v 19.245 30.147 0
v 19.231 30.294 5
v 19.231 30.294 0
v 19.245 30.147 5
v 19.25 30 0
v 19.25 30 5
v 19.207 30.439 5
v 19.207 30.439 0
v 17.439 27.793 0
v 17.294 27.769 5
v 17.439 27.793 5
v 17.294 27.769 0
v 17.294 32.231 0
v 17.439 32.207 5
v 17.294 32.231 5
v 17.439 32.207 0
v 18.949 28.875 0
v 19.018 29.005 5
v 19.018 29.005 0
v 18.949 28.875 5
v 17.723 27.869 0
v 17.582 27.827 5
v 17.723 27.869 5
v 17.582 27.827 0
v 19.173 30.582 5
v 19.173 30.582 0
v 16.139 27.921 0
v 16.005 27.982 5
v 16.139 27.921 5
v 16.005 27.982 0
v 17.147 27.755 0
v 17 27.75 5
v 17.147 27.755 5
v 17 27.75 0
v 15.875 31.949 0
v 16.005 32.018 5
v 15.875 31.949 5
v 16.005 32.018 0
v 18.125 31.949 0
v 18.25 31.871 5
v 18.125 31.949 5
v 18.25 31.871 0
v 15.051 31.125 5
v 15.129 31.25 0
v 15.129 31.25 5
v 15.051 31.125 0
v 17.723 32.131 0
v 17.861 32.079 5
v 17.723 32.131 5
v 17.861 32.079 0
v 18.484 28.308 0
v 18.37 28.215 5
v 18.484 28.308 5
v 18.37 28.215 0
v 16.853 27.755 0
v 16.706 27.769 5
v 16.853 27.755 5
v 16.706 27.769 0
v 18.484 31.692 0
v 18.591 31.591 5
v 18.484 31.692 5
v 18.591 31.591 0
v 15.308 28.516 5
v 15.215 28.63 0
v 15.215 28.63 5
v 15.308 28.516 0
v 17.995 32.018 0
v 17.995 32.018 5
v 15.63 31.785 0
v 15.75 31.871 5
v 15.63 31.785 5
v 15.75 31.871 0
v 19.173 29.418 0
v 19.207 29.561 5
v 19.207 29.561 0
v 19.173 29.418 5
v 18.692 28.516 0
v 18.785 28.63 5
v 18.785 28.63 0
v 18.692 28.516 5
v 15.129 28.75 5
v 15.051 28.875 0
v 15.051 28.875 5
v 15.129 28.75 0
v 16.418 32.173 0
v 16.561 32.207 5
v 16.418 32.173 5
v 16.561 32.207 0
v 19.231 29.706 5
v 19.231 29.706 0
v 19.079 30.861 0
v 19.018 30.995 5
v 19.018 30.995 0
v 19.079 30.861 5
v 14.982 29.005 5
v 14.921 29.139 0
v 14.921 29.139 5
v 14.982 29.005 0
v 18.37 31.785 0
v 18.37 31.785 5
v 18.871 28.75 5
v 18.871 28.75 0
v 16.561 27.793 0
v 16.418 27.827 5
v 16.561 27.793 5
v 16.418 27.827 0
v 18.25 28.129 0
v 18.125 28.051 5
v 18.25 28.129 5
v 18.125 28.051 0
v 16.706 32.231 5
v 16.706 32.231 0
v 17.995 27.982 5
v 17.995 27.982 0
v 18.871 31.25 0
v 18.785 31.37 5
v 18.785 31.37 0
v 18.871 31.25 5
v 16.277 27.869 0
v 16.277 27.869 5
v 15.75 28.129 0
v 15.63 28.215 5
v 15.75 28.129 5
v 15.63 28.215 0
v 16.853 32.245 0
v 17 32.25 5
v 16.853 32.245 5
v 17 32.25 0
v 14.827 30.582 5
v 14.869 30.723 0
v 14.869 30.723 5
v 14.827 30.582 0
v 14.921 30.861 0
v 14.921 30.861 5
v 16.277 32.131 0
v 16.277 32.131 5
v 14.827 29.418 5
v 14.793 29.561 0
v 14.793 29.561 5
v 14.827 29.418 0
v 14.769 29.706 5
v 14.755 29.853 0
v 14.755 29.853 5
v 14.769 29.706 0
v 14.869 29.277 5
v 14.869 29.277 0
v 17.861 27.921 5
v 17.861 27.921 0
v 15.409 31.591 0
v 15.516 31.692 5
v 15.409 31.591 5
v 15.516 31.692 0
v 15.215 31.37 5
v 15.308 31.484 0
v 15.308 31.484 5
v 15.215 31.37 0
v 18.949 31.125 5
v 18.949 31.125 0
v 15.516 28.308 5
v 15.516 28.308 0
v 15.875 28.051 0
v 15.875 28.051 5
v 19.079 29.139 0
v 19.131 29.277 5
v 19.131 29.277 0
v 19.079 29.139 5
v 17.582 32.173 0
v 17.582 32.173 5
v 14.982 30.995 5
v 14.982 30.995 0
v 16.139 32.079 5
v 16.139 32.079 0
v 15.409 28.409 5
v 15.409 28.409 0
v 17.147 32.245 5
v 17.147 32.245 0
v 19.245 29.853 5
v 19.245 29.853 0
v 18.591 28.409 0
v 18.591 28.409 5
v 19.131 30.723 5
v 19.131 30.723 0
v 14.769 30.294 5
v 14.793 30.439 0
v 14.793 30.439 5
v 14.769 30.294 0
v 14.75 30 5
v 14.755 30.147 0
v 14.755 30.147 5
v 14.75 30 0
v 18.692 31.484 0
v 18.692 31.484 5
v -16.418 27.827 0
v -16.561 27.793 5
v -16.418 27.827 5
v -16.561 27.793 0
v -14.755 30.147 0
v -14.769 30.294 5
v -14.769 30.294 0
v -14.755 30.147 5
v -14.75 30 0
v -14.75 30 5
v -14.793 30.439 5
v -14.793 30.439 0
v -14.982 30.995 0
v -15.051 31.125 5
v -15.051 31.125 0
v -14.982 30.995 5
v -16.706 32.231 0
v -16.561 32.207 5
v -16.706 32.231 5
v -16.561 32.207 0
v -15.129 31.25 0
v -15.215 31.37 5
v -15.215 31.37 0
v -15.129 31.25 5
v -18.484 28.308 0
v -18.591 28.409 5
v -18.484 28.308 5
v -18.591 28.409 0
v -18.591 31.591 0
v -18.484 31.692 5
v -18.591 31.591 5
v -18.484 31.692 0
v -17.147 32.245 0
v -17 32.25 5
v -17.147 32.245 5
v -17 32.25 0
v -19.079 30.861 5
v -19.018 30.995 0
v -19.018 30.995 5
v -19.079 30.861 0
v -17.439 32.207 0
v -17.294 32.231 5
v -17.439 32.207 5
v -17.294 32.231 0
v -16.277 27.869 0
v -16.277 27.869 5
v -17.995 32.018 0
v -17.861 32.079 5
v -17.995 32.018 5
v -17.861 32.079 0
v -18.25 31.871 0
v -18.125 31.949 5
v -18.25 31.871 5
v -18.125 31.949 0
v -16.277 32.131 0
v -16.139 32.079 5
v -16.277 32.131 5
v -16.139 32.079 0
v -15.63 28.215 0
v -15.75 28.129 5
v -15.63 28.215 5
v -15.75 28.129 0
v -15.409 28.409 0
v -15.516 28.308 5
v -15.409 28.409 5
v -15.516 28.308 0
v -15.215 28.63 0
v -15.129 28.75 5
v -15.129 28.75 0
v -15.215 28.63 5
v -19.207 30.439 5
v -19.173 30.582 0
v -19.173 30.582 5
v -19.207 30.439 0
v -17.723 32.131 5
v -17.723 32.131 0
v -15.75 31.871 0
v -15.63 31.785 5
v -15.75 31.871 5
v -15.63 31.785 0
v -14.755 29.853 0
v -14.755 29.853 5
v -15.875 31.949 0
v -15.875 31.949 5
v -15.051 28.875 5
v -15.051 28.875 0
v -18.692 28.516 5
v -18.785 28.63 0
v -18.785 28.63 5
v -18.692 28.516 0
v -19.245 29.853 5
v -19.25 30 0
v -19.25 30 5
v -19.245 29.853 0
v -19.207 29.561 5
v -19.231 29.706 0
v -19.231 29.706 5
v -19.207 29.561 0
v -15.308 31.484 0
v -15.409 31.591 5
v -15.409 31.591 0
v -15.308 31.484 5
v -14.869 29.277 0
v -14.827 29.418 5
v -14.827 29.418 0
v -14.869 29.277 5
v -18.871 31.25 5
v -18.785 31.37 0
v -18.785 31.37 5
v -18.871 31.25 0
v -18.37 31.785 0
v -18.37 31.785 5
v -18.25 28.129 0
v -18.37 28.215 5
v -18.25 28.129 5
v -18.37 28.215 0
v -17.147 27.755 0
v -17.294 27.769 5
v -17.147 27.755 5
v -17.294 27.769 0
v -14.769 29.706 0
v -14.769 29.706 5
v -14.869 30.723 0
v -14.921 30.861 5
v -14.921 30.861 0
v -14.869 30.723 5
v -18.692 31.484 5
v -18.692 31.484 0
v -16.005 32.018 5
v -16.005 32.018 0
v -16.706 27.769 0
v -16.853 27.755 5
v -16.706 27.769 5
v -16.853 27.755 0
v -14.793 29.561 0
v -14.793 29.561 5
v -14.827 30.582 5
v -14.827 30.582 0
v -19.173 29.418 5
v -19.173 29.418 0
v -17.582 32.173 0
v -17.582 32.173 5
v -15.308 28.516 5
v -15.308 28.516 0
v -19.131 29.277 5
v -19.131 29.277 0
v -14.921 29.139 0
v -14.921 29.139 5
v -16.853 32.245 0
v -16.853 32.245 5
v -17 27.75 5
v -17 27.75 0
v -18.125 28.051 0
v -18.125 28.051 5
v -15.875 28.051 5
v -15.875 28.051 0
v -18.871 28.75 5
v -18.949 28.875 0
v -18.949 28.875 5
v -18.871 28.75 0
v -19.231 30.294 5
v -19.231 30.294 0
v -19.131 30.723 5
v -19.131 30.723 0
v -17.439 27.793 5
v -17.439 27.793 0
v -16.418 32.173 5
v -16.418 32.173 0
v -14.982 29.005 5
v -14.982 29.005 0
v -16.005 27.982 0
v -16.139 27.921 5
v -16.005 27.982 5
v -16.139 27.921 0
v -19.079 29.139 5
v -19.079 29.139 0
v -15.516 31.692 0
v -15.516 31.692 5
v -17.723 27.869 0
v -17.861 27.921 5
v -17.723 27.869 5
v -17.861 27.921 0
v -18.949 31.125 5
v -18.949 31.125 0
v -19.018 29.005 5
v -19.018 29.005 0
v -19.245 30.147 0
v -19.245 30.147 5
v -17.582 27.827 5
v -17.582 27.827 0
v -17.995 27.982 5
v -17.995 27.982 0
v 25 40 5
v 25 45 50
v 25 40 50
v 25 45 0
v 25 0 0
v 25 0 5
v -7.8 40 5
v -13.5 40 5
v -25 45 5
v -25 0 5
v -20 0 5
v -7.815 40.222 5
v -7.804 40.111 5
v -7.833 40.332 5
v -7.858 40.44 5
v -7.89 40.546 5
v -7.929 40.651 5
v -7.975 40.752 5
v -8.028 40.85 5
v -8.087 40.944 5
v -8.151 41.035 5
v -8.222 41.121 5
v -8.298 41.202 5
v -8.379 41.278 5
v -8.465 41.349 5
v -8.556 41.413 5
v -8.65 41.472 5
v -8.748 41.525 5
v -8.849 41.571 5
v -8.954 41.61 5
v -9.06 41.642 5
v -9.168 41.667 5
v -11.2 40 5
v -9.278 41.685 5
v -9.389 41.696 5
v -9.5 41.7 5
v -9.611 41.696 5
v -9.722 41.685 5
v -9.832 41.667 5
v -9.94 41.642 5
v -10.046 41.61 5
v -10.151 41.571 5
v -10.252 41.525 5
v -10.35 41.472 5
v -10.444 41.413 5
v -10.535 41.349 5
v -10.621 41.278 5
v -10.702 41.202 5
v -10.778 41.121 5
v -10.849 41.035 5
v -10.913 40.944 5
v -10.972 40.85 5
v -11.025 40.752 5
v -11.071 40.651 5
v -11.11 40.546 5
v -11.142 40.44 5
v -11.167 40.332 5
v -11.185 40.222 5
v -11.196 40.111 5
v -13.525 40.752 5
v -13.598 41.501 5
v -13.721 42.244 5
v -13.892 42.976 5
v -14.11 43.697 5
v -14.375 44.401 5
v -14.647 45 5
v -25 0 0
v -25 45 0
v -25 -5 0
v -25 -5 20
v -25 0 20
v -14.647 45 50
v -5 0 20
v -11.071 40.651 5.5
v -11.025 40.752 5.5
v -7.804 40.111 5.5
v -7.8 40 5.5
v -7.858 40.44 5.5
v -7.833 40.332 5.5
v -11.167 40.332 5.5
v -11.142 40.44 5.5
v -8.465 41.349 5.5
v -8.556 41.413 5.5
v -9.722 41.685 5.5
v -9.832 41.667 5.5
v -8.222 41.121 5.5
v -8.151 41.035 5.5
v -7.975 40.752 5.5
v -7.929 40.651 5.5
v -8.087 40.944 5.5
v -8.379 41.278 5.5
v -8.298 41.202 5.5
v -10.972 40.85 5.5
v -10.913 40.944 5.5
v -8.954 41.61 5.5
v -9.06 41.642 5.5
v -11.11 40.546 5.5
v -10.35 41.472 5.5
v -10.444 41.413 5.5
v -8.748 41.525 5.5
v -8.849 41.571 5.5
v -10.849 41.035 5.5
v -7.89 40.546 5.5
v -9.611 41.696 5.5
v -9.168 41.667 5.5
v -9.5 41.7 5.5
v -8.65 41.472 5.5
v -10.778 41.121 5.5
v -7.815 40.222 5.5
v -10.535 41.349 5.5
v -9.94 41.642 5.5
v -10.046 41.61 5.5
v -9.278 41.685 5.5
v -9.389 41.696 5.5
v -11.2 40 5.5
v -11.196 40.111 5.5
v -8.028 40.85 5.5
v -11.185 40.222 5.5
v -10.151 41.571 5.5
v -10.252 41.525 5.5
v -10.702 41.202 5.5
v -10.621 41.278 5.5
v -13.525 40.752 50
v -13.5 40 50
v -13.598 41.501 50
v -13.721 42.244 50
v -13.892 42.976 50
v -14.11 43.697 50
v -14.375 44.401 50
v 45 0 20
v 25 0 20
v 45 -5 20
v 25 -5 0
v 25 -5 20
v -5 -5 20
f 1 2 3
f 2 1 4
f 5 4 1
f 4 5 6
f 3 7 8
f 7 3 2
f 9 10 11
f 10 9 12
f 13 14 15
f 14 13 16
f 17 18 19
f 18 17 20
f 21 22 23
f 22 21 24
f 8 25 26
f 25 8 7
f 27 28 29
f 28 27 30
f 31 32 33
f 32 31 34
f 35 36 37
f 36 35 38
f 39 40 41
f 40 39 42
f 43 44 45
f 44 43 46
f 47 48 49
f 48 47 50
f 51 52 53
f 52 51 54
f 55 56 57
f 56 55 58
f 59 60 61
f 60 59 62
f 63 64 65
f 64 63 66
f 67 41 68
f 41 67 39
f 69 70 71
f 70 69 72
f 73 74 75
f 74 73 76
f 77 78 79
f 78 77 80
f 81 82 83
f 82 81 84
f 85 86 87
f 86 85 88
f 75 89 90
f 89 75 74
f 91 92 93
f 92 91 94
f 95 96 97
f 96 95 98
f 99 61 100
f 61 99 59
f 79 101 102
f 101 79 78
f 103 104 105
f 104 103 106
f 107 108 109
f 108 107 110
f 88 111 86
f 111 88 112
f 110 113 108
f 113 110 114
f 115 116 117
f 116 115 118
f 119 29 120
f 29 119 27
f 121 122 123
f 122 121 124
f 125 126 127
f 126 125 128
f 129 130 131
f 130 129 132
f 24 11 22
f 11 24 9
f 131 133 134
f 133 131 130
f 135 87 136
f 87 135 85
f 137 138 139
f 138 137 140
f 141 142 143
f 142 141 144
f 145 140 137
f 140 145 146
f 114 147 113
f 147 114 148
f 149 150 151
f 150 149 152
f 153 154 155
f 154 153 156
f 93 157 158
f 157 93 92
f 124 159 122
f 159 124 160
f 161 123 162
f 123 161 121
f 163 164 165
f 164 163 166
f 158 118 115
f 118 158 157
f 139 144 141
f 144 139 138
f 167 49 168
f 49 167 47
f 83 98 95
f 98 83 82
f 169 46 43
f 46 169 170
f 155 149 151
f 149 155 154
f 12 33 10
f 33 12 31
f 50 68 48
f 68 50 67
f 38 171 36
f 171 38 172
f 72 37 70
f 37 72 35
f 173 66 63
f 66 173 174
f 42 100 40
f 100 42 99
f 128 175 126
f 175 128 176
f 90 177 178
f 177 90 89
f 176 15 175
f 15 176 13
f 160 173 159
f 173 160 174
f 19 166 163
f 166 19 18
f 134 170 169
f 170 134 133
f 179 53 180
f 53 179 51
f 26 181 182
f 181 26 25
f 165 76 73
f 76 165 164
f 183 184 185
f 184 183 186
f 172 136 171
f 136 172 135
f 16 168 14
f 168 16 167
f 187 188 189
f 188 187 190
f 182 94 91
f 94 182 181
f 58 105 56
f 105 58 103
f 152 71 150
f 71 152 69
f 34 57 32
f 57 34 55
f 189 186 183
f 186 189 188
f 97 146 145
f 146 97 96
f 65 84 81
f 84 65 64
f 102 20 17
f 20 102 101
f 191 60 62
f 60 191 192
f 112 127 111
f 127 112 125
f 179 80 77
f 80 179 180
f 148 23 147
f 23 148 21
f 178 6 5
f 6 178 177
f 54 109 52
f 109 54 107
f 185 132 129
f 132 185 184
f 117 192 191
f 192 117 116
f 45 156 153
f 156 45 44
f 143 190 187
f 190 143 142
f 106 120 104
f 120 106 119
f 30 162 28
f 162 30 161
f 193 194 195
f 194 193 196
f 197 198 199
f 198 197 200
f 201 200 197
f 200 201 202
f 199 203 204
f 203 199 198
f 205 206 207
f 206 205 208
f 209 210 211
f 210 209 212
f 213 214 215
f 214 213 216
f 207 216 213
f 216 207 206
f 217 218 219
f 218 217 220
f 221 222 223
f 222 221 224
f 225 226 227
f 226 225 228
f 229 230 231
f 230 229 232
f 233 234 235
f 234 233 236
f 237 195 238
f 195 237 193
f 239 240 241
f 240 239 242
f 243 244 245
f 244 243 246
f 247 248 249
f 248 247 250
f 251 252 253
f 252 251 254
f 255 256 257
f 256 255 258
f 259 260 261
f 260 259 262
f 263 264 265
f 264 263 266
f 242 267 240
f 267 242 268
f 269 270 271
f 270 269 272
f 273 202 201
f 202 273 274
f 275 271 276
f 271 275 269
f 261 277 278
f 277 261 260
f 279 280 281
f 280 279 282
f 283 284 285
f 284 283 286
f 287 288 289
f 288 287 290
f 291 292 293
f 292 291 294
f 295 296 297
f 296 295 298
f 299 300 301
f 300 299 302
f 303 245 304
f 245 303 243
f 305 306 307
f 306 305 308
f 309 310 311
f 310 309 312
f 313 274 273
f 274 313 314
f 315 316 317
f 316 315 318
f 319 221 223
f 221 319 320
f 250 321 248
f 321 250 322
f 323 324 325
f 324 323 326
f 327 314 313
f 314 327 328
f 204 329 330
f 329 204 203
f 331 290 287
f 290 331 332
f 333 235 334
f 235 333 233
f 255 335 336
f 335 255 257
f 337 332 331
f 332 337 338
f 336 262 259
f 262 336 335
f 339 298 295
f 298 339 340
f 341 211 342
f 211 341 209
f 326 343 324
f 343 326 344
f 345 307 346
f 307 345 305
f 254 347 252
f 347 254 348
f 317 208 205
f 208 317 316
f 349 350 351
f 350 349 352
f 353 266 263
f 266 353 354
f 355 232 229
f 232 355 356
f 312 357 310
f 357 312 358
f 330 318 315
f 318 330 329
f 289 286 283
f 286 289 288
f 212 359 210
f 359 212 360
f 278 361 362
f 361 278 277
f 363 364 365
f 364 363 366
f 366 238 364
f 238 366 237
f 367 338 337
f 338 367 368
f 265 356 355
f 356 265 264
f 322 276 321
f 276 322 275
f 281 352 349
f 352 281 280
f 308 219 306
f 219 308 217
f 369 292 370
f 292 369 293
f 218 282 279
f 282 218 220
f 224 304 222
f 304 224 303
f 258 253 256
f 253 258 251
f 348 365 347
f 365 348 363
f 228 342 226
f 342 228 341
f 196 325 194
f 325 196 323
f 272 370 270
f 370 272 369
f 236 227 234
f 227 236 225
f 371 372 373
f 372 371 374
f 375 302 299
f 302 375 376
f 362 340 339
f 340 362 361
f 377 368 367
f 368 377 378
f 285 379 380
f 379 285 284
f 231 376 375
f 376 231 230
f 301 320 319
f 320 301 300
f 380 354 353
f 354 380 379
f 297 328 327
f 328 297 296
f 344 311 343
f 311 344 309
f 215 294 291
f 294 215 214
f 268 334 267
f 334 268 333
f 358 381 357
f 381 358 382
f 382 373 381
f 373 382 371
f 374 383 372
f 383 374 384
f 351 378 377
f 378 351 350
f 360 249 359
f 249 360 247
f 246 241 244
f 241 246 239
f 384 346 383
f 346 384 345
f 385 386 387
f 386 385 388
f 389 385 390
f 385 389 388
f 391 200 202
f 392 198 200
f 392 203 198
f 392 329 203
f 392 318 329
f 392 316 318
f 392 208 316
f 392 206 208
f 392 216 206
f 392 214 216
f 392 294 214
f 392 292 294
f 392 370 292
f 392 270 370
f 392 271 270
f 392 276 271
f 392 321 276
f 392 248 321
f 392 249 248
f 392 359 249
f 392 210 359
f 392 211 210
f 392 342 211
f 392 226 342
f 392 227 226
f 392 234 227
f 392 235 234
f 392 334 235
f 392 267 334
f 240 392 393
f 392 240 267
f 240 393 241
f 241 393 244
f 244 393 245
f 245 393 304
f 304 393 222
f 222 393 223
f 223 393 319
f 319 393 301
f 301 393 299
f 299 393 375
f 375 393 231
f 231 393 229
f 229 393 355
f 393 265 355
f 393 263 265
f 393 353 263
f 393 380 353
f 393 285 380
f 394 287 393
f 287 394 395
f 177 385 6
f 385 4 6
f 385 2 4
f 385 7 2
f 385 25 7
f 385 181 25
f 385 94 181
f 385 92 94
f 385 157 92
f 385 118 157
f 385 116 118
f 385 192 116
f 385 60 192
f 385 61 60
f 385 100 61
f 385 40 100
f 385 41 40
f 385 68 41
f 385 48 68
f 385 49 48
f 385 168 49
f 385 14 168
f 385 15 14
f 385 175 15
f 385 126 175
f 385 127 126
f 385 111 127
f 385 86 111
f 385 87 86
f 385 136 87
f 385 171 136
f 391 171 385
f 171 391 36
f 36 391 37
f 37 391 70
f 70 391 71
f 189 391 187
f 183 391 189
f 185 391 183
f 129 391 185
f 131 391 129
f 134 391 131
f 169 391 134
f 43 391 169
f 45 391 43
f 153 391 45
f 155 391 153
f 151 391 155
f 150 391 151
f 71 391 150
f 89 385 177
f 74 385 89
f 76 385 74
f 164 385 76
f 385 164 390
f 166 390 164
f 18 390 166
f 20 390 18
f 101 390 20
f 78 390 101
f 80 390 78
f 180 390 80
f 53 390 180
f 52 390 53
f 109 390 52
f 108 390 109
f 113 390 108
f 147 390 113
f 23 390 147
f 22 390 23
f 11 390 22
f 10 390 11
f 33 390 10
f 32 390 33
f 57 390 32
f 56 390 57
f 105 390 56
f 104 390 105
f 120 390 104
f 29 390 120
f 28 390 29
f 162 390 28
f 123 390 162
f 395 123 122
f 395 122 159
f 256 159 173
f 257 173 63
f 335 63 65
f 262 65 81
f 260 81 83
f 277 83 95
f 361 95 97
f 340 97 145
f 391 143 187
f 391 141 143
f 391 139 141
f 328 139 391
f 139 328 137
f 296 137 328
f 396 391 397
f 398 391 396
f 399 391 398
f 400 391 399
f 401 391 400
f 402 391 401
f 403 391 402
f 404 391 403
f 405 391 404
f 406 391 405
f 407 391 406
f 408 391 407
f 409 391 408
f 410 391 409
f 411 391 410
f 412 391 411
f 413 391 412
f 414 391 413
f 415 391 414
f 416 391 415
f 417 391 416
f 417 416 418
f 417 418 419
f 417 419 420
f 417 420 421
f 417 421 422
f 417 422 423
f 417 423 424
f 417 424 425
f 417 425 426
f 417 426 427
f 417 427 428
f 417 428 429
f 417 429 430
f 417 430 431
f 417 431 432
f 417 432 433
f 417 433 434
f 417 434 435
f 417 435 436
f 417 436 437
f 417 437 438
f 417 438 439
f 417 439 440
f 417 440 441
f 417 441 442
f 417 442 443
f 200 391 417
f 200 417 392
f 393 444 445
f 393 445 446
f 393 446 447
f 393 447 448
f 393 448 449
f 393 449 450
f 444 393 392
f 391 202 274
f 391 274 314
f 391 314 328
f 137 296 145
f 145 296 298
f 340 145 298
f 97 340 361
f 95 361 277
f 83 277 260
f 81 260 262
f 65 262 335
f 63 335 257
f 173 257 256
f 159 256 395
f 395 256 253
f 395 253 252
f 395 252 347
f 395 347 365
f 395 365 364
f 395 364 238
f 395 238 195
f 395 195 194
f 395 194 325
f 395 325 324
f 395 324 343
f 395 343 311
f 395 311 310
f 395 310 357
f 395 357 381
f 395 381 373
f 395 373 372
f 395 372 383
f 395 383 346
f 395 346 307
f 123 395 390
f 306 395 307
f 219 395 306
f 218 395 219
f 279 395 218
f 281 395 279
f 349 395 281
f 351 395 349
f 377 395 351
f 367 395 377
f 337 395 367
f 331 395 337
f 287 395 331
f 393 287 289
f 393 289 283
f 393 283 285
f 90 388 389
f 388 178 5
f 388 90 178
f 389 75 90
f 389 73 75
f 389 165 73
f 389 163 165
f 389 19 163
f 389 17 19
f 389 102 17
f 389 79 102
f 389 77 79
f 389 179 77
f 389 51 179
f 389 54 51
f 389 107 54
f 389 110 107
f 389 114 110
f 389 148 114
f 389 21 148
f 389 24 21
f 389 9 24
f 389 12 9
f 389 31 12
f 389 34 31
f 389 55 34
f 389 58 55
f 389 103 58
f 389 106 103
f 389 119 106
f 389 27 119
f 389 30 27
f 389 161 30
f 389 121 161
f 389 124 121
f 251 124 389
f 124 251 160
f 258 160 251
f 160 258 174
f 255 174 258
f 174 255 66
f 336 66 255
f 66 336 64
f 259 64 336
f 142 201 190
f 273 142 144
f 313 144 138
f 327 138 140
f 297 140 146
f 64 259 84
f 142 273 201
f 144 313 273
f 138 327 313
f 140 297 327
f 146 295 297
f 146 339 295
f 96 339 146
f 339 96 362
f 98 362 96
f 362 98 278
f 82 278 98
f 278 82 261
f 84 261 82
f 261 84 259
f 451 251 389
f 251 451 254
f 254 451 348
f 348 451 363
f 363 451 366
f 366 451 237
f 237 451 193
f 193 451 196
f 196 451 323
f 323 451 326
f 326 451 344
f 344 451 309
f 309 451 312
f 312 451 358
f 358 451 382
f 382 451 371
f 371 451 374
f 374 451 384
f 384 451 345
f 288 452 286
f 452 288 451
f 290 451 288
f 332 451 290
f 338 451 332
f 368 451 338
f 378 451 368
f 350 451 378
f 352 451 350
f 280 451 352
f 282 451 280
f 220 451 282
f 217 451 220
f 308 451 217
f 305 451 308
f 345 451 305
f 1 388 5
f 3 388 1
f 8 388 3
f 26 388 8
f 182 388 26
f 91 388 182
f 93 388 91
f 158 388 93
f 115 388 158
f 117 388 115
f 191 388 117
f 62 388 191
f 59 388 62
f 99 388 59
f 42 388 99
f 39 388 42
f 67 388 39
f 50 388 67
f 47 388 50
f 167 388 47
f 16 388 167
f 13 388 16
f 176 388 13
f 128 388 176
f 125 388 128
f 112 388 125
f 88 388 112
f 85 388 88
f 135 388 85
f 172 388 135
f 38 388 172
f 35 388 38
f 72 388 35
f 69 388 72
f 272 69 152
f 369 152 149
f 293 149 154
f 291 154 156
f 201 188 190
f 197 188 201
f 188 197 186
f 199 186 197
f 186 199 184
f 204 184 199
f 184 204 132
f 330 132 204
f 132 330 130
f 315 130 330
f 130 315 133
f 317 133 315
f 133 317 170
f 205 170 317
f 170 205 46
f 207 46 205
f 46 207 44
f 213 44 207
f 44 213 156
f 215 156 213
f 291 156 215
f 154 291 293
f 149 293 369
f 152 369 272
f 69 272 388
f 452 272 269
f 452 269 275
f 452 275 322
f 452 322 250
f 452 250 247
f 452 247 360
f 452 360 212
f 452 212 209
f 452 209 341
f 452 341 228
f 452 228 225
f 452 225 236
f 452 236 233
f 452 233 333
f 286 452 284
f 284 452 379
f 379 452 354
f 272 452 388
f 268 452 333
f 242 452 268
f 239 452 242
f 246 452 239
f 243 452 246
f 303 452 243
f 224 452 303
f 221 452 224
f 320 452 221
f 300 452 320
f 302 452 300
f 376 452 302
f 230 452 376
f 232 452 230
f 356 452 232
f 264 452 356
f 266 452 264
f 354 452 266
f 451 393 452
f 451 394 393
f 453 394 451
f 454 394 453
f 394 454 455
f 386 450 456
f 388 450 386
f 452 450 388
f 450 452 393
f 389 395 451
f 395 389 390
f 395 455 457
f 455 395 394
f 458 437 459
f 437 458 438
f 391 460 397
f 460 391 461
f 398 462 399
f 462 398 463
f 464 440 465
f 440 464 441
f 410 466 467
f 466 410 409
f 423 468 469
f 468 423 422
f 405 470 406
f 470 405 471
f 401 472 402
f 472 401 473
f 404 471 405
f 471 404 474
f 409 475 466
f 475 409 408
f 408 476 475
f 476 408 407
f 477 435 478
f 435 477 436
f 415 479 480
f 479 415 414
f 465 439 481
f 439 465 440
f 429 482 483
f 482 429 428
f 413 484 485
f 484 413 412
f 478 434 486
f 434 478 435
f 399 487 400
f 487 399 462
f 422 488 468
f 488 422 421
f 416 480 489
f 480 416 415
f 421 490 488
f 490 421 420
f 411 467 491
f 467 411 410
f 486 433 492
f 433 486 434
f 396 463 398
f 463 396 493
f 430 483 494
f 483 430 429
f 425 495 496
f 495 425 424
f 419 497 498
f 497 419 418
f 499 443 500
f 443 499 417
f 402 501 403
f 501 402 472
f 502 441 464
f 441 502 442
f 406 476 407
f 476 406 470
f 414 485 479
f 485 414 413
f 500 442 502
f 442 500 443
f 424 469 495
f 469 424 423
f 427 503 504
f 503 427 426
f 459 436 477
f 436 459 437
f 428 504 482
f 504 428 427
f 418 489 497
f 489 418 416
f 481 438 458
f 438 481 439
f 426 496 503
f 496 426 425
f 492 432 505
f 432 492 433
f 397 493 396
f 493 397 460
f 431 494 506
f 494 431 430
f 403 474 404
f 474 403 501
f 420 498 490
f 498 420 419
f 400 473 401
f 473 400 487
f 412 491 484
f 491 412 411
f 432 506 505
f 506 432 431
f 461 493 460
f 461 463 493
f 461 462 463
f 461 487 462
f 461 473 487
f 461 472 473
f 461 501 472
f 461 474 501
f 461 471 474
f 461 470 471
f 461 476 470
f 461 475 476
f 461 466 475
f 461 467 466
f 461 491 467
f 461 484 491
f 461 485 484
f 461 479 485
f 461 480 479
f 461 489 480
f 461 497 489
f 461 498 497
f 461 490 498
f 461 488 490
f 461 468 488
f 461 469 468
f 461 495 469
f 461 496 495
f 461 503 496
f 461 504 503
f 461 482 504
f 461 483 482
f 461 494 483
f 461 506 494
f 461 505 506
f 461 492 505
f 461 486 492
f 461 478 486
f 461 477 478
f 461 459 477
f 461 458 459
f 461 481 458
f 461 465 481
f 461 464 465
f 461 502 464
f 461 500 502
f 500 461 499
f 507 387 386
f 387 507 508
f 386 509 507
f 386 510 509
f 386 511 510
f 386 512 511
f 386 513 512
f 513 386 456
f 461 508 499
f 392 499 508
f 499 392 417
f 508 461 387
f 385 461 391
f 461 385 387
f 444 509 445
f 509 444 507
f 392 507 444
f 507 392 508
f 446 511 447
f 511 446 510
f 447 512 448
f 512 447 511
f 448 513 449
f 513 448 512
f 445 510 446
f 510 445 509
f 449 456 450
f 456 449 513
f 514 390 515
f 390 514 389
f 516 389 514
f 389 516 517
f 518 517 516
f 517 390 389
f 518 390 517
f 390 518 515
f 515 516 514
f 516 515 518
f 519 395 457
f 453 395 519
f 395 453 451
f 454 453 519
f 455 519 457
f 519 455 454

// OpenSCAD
// L-shaped mounting bracket for a NEMA 17 stepper motor (e.g. syringe pump)
// Print orientation: base plate on the bed, vertical plate builds upward (+Z)

// ---------------- Parameters ----------------
plate_w      = 50;    // base plate length (X), also vertical plate width (X)
plate_h      = 45;    // base plate depth (Y)
plate_t      = 5;     // base plate thickness (Z)

hole_m4_x    = -17;   // M4 through-hole X position (base plate)
hole_m4_y    = 30;    // M4 through-hole Y position (base plate)
hole_m4_d    = 4.5;   // M4 through-hole diameter

motor_h      = 50;    // vertical motor plate height (Z)
motor_d      = 23;    // motor centring boss hole diameter
motor_z      = 28;    // motor boss hole centre height (Z)

screw_d      = 3.4;   // M3 screw hole diameter
screw_pitch  = 31;    // M3 screw hole square pattern size (X and Y)

gusset_t     = 5;     // triangular gusset thickness (Y)
gusset_l     = 20;    // gusset leg length along +Y and +Z
gusset_x0    = -25;   // gusset start X (left edge)
gusset_x1    = 25;    // gusset start X (right edge)

eps          = 0.5;   // cutter overshoot past faces

$fn = 96;

// ---------------- Model ----------------
union() {
    // Base plate with M4 through-holes
    difference() {
        translate([-plate_w/2, 0, 0])
            cube([plate_w, plate_h, plate_t]);
        for (sx = [-1, 1])
            translate([sx * hole_m4_x, hole_m4_y, -eps])
                cylinder(d = hole_m4_d, h = plate_t + 2*eps);
    }

    // Vertical motor plate with boss hole and M3 screw holes
    translate([-plate_w/2, plate_h - gusset_t, 0])
        difference() {
            cube([plate_w, gusset_t, motor_h]);
            translate([0, 0, -eps])
                cylinder(d = motor_d, h = motor_h + 2*eps);
            for (a = [0, 90, 180, 270])
                rotate([0, 0, a])
                    translate([-screw_pitch/2, 0, -eps])
                        cylinder(d = screw_d, h = gusset_t + 2*eps);
        }

    // Triangular gussets, flush with the outer X edges
    for (sx = [-1, 1])
        translate([sx * gusset_x0, 0, 0])
            rotate([90, 0, 0])
                linear_extrude(height = gusset_t)
                    polygon(points = [
                        [0, 0],
                        [0, gusset_l],
                        [gusset_l, gusset_l]
                    ]);
}
